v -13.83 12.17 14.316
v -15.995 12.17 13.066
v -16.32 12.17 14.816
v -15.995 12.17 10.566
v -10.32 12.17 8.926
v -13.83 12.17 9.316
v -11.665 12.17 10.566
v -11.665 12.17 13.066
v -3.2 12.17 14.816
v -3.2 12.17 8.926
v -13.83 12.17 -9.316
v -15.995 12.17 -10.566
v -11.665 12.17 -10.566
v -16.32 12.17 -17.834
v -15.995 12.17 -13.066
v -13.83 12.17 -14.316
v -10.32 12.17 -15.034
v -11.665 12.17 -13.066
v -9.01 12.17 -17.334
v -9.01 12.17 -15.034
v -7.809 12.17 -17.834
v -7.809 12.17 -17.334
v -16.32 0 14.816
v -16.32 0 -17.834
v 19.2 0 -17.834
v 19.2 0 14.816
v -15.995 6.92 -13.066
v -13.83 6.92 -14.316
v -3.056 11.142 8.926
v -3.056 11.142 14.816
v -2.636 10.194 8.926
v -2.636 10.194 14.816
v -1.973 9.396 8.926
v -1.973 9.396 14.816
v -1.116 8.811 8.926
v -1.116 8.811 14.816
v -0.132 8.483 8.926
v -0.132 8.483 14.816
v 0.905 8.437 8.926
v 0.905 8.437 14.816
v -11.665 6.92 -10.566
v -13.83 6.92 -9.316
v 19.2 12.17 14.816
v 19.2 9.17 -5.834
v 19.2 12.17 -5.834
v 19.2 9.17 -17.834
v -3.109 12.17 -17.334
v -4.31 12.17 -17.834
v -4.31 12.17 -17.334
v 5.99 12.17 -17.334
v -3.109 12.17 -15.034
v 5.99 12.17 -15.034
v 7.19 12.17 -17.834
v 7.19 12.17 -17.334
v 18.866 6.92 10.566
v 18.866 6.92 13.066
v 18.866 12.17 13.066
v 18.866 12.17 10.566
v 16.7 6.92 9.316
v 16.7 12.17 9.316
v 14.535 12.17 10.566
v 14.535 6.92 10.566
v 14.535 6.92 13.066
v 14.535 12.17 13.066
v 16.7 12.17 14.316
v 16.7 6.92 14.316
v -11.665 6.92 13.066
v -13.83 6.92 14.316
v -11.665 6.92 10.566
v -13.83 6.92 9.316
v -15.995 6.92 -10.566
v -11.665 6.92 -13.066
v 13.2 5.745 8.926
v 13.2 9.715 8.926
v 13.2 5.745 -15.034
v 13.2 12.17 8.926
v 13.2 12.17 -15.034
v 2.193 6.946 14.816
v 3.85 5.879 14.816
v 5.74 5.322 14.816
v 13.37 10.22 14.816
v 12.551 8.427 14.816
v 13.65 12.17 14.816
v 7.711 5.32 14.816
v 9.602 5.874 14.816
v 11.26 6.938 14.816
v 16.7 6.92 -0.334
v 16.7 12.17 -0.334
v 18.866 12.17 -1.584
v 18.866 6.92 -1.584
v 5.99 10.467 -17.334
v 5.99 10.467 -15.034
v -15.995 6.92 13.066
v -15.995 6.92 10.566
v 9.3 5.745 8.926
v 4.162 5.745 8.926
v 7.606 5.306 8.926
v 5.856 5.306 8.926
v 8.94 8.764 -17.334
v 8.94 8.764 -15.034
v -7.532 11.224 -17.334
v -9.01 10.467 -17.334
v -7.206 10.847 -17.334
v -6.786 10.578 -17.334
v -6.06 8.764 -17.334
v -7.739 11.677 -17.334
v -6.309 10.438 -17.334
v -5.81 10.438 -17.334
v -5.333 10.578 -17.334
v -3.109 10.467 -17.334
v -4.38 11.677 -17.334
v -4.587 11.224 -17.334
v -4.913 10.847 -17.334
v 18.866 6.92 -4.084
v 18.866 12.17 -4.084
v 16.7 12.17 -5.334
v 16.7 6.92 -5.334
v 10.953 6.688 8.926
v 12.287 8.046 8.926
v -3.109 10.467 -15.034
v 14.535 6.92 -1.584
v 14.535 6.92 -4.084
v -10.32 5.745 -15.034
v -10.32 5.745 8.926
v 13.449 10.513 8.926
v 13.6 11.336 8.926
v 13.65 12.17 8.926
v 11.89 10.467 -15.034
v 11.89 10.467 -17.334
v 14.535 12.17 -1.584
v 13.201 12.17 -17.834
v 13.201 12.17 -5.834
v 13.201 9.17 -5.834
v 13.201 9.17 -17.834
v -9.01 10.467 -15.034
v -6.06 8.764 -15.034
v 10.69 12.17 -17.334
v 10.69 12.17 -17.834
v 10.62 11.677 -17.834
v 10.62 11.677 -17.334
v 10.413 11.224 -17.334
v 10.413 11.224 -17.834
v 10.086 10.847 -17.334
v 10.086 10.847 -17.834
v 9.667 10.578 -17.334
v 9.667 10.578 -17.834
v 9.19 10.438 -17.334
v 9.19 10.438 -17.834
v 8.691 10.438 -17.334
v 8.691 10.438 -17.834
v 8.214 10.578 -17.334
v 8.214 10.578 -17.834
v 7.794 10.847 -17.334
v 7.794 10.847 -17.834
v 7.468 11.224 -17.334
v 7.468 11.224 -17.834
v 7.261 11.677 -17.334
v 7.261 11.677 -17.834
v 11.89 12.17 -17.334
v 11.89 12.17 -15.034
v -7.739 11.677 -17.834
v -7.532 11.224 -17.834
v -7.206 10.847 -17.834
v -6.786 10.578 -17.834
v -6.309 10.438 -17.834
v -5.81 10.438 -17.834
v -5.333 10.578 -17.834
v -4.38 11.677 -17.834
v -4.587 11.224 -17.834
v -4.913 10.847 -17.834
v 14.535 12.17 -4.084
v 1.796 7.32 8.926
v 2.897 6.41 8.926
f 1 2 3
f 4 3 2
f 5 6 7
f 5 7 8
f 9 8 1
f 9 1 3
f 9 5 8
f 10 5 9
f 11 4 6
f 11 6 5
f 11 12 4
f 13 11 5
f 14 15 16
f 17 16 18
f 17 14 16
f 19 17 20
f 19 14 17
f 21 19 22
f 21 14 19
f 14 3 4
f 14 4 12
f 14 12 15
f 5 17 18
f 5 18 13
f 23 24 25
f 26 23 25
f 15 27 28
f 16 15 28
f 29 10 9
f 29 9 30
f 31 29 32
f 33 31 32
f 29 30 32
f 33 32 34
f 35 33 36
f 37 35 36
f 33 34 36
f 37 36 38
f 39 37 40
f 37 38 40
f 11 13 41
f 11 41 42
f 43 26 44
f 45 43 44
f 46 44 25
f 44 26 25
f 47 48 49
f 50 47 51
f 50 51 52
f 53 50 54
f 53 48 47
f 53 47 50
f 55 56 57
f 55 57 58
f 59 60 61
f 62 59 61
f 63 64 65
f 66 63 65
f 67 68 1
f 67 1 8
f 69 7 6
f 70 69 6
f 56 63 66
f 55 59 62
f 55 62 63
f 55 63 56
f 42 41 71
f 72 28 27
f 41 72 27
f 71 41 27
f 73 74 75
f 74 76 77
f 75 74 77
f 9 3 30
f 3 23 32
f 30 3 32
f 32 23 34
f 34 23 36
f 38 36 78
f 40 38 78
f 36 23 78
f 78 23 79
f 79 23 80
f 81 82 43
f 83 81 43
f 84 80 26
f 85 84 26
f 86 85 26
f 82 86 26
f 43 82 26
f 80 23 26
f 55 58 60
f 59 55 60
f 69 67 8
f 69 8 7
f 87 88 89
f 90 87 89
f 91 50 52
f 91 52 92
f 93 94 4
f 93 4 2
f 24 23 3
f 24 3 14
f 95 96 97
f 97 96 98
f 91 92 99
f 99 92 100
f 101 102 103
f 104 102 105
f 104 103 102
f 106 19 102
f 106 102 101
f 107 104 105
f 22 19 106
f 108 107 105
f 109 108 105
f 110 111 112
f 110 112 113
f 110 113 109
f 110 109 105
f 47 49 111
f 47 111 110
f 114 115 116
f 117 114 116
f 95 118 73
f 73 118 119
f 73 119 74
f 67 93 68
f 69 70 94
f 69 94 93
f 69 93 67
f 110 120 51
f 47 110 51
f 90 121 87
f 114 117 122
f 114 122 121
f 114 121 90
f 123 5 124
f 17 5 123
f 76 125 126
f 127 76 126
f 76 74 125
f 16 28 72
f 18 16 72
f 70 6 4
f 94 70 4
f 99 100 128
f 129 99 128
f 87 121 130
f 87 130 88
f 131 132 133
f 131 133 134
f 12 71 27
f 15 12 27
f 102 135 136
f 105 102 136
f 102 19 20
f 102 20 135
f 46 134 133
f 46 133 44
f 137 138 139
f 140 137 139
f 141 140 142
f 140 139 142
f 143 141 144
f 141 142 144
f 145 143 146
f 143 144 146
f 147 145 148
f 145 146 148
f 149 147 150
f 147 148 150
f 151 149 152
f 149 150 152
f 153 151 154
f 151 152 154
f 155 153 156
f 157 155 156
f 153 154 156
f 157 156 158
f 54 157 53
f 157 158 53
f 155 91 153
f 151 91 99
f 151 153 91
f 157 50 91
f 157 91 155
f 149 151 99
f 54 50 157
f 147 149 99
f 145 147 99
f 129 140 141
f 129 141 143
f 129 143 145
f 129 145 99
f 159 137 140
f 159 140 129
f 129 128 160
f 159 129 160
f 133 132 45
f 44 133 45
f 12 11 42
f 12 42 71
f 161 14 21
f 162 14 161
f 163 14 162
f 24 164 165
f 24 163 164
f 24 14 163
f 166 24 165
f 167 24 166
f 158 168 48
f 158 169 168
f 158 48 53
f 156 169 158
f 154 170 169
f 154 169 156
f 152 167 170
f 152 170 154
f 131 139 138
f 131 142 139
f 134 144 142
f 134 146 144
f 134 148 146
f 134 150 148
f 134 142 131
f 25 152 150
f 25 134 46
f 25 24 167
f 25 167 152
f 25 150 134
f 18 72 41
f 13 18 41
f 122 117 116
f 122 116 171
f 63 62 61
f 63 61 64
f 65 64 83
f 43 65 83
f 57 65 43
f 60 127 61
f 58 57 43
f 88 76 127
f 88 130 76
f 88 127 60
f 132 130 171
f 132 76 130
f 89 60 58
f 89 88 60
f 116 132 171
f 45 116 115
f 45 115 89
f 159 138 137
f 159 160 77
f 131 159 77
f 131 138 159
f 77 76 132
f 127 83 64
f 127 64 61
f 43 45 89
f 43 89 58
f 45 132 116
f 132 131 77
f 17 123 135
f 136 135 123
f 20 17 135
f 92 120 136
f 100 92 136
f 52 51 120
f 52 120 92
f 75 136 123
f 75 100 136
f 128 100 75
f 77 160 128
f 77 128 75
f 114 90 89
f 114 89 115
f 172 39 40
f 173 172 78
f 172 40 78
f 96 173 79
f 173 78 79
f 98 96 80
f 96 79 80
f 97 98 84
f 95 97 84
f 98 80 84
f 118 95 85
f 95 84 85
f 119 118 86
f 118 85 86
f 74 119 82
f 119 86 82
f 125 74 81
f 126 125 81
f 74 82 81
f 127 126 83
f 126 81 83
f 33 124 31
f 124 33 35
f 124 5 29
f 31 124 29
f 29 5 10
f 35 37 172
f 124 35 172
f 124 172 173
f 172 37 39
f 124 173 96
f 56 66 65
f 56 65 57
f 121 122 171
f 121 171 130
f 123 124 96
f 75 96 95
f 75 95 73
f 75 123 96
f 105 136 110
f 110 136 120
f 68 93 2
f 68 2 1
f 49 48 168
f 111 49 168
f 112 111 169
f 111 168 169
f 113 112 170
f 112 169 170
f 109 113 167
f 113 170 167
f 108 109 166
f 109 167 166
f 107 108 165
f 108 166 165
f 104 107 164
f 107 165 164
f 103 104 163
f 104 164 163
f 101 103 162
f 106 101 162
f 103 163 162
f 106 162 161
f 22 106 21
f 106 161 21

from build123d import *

# Parameters (mm, degrees)
SKETCH1_W               = 35.519995
SKETCH1_H               = 32.6499982
BOSS_EXTRUDE1_DEPTH     = 12.1700036
CUT_EXTRUDE1_DEPTH      = 29.893301397
CUT_EXTRUDE1_DEPTH_BACK = 5.2499768
SKETCH3_W               = 5.999988
SKETCH3_H               = 12.0000014
CUT_EXTRUDE2_DEPTH      = 2.999994
SKETCH4_W               = 23.5199936
SKETCH4_H               = 23.9599978
CUT_EXTRUDE3_DEPTH      = 6.4250062
CUT_EXTRUDE5_DEPTH      = 5.890006
CUT_EXTRUDE6_DEPTH      = 2.2999954
SKETCH8_R               = 1.7499965
CUT_EXTRUDE7_DEPTH      = 2.7999944


with BuildPart() as part:
    # Sketch1 → Boss-Extrude1 (new body)
    with BuildSketch(Plane(origin=(0, 0, 0), x_dir=(1, 0, 0), z_dir=(0, 1, 0))):
        with Locations((1.4404975, 1.509093805)):
            Rectangle(SKETCH1_W, SKETCH1_H)
    extrude(amount=BOSS_EXTRUDE1_DEPTH)

    # Sketch2 → Cut-Extrude1 (cut, two sides: drawn at the far end of the back side and taken through both)
    with BuildSketch(Plane(origin=(0, 12.1700036, 0), x_dir=(1, 0, 0), z_dir=(0, 1, 0)).offset(-CUT_EXTRUDE1_DEPTH_BACK)):
        Polygon((-13.8303, -9.315916295), (-15.995359179, -10.565913795), (-15.995359179, -13.065908795), (-13.8303, -14.315906295), (-11.665240821, -13.065908795), (-11.665240821, -10.565913795), align=None)
        Polygon((-11.665240821, 10.565913795), (-13.8303, 9.315916295), (-15.995359179, 10.565913795), (-15.995359179, 13.065908795), (-13.8303, 14.315906295), (-11.665240821, 13.065908795), align=None)
        Polygon((16.7005, 5.334067105), (14.535440821, 4.084069605), (14.535440821, 1.584074605), (16.7005, 0.334077105), (18.865559179, 1.584074605), (18.865559179, 4.084069605), align=None)
        Polygon((16.7005, -14.315906295), (18.865559179, -13.065908795), (18.865559179, -10.565913795), (16.7005, -9.315916295), (14.535440821, -10.565913795), (14.535440821, -13.065908795), align=None)
    extrude(amount=CUT_EXTRUDE1_DEPTH + CUT_EXTRUDE1_DEPTH_BACK, mode=Mode.SUBTRACT)

    # Sketch3 → Cut-Extrude2 (cut)
    with BuildSketch(Plane(origin=(0, 12.1700036, 0), x_dir=(1, 0, 0), z_dir=(0, 1, 0))):
        with Locations((16.200501, 11.834092205)):
            Rectangle(SKETCH3_W, SKETCH3_H)
    extrude(amount=-CUT_EXTRUDE2_DEPTH, mode=Mode.SUBTRACT)

    # Sketch4 → Cut-Extrude3 (cut)
    with BuildSketch(Plane(origin=(0, 12.1700036, 0), x_dir=(1, 0, 0), z_dir=(0, 1, 0))):
        with Locations((1.4404848, 3.054099605)):
            Rectangle(SKETCH4_W, SKETCH4_H)
    extrude(amount=-CUT_EXTRUDE3_DEPTH, mode=Mode.SUBTRACT)

    # Sketch6 → Cut-Extrude5 (cut)
    with BuildSketch(Plane.XY.offset(14.815905295)):
        with BuildLine():
            ThreePointArc((0.90468468, 8.436788325), (13.6504934, 12.1700036), (0.90468468, 15.903218875))
            ThreePointArc((0.90468468, 15.903218875), (-3.199511, 12.1700036), (0.90468468, 8.436788325))
        make_face()
    extrude(amount=-CUT_EXTRUDE5_DEPTH, mode=Mode.SUBTRACT)

    # Sketch7 → Cut-Extrude6 (cut)
    with BuildSketch(Plane.XY.offset(-15.034098505)):
        Polygon((8.9404952, 8.763635), (11.890496942, 10.4668193), (11.890496942, 13.8731879), (8.9404952, 15.5763722), (5.990493458, 13.8731879), (5.990493458, 10.4668193), align=None)
        Polygon((-6.0595002, 8.763635), (-3.109498458, 10.4668193), (-3.109498458, 13.8731879), (-6.0595002, 15.5763722), (-9.009501942, 13.8731879), (-9.009501942, 10.4668193), align=None)
    extrude(amount=-CUT_EXTRUDE6_DEPTH, mode=Mode.SUBTRACT)

    # Sketch8 → Cut-Extrude7 (cut)
    with BuildSketch(Plane(origin=(0, 0, -17.834092905), x_dir=(-1, 0, 0), z_dir=(0, 0, -1))):
        with Locations((-8.9404952, 12.1700036)):
            Circle(SKETCH8_R)
        with Locations((6.0595002, 12.1700036)):
            Circle(SKETCH8_R)
    extrude(amount=-CUT_EXTRUDE7_DEPTH, mode=Mode.SUBTRACT)


solid = part.part
